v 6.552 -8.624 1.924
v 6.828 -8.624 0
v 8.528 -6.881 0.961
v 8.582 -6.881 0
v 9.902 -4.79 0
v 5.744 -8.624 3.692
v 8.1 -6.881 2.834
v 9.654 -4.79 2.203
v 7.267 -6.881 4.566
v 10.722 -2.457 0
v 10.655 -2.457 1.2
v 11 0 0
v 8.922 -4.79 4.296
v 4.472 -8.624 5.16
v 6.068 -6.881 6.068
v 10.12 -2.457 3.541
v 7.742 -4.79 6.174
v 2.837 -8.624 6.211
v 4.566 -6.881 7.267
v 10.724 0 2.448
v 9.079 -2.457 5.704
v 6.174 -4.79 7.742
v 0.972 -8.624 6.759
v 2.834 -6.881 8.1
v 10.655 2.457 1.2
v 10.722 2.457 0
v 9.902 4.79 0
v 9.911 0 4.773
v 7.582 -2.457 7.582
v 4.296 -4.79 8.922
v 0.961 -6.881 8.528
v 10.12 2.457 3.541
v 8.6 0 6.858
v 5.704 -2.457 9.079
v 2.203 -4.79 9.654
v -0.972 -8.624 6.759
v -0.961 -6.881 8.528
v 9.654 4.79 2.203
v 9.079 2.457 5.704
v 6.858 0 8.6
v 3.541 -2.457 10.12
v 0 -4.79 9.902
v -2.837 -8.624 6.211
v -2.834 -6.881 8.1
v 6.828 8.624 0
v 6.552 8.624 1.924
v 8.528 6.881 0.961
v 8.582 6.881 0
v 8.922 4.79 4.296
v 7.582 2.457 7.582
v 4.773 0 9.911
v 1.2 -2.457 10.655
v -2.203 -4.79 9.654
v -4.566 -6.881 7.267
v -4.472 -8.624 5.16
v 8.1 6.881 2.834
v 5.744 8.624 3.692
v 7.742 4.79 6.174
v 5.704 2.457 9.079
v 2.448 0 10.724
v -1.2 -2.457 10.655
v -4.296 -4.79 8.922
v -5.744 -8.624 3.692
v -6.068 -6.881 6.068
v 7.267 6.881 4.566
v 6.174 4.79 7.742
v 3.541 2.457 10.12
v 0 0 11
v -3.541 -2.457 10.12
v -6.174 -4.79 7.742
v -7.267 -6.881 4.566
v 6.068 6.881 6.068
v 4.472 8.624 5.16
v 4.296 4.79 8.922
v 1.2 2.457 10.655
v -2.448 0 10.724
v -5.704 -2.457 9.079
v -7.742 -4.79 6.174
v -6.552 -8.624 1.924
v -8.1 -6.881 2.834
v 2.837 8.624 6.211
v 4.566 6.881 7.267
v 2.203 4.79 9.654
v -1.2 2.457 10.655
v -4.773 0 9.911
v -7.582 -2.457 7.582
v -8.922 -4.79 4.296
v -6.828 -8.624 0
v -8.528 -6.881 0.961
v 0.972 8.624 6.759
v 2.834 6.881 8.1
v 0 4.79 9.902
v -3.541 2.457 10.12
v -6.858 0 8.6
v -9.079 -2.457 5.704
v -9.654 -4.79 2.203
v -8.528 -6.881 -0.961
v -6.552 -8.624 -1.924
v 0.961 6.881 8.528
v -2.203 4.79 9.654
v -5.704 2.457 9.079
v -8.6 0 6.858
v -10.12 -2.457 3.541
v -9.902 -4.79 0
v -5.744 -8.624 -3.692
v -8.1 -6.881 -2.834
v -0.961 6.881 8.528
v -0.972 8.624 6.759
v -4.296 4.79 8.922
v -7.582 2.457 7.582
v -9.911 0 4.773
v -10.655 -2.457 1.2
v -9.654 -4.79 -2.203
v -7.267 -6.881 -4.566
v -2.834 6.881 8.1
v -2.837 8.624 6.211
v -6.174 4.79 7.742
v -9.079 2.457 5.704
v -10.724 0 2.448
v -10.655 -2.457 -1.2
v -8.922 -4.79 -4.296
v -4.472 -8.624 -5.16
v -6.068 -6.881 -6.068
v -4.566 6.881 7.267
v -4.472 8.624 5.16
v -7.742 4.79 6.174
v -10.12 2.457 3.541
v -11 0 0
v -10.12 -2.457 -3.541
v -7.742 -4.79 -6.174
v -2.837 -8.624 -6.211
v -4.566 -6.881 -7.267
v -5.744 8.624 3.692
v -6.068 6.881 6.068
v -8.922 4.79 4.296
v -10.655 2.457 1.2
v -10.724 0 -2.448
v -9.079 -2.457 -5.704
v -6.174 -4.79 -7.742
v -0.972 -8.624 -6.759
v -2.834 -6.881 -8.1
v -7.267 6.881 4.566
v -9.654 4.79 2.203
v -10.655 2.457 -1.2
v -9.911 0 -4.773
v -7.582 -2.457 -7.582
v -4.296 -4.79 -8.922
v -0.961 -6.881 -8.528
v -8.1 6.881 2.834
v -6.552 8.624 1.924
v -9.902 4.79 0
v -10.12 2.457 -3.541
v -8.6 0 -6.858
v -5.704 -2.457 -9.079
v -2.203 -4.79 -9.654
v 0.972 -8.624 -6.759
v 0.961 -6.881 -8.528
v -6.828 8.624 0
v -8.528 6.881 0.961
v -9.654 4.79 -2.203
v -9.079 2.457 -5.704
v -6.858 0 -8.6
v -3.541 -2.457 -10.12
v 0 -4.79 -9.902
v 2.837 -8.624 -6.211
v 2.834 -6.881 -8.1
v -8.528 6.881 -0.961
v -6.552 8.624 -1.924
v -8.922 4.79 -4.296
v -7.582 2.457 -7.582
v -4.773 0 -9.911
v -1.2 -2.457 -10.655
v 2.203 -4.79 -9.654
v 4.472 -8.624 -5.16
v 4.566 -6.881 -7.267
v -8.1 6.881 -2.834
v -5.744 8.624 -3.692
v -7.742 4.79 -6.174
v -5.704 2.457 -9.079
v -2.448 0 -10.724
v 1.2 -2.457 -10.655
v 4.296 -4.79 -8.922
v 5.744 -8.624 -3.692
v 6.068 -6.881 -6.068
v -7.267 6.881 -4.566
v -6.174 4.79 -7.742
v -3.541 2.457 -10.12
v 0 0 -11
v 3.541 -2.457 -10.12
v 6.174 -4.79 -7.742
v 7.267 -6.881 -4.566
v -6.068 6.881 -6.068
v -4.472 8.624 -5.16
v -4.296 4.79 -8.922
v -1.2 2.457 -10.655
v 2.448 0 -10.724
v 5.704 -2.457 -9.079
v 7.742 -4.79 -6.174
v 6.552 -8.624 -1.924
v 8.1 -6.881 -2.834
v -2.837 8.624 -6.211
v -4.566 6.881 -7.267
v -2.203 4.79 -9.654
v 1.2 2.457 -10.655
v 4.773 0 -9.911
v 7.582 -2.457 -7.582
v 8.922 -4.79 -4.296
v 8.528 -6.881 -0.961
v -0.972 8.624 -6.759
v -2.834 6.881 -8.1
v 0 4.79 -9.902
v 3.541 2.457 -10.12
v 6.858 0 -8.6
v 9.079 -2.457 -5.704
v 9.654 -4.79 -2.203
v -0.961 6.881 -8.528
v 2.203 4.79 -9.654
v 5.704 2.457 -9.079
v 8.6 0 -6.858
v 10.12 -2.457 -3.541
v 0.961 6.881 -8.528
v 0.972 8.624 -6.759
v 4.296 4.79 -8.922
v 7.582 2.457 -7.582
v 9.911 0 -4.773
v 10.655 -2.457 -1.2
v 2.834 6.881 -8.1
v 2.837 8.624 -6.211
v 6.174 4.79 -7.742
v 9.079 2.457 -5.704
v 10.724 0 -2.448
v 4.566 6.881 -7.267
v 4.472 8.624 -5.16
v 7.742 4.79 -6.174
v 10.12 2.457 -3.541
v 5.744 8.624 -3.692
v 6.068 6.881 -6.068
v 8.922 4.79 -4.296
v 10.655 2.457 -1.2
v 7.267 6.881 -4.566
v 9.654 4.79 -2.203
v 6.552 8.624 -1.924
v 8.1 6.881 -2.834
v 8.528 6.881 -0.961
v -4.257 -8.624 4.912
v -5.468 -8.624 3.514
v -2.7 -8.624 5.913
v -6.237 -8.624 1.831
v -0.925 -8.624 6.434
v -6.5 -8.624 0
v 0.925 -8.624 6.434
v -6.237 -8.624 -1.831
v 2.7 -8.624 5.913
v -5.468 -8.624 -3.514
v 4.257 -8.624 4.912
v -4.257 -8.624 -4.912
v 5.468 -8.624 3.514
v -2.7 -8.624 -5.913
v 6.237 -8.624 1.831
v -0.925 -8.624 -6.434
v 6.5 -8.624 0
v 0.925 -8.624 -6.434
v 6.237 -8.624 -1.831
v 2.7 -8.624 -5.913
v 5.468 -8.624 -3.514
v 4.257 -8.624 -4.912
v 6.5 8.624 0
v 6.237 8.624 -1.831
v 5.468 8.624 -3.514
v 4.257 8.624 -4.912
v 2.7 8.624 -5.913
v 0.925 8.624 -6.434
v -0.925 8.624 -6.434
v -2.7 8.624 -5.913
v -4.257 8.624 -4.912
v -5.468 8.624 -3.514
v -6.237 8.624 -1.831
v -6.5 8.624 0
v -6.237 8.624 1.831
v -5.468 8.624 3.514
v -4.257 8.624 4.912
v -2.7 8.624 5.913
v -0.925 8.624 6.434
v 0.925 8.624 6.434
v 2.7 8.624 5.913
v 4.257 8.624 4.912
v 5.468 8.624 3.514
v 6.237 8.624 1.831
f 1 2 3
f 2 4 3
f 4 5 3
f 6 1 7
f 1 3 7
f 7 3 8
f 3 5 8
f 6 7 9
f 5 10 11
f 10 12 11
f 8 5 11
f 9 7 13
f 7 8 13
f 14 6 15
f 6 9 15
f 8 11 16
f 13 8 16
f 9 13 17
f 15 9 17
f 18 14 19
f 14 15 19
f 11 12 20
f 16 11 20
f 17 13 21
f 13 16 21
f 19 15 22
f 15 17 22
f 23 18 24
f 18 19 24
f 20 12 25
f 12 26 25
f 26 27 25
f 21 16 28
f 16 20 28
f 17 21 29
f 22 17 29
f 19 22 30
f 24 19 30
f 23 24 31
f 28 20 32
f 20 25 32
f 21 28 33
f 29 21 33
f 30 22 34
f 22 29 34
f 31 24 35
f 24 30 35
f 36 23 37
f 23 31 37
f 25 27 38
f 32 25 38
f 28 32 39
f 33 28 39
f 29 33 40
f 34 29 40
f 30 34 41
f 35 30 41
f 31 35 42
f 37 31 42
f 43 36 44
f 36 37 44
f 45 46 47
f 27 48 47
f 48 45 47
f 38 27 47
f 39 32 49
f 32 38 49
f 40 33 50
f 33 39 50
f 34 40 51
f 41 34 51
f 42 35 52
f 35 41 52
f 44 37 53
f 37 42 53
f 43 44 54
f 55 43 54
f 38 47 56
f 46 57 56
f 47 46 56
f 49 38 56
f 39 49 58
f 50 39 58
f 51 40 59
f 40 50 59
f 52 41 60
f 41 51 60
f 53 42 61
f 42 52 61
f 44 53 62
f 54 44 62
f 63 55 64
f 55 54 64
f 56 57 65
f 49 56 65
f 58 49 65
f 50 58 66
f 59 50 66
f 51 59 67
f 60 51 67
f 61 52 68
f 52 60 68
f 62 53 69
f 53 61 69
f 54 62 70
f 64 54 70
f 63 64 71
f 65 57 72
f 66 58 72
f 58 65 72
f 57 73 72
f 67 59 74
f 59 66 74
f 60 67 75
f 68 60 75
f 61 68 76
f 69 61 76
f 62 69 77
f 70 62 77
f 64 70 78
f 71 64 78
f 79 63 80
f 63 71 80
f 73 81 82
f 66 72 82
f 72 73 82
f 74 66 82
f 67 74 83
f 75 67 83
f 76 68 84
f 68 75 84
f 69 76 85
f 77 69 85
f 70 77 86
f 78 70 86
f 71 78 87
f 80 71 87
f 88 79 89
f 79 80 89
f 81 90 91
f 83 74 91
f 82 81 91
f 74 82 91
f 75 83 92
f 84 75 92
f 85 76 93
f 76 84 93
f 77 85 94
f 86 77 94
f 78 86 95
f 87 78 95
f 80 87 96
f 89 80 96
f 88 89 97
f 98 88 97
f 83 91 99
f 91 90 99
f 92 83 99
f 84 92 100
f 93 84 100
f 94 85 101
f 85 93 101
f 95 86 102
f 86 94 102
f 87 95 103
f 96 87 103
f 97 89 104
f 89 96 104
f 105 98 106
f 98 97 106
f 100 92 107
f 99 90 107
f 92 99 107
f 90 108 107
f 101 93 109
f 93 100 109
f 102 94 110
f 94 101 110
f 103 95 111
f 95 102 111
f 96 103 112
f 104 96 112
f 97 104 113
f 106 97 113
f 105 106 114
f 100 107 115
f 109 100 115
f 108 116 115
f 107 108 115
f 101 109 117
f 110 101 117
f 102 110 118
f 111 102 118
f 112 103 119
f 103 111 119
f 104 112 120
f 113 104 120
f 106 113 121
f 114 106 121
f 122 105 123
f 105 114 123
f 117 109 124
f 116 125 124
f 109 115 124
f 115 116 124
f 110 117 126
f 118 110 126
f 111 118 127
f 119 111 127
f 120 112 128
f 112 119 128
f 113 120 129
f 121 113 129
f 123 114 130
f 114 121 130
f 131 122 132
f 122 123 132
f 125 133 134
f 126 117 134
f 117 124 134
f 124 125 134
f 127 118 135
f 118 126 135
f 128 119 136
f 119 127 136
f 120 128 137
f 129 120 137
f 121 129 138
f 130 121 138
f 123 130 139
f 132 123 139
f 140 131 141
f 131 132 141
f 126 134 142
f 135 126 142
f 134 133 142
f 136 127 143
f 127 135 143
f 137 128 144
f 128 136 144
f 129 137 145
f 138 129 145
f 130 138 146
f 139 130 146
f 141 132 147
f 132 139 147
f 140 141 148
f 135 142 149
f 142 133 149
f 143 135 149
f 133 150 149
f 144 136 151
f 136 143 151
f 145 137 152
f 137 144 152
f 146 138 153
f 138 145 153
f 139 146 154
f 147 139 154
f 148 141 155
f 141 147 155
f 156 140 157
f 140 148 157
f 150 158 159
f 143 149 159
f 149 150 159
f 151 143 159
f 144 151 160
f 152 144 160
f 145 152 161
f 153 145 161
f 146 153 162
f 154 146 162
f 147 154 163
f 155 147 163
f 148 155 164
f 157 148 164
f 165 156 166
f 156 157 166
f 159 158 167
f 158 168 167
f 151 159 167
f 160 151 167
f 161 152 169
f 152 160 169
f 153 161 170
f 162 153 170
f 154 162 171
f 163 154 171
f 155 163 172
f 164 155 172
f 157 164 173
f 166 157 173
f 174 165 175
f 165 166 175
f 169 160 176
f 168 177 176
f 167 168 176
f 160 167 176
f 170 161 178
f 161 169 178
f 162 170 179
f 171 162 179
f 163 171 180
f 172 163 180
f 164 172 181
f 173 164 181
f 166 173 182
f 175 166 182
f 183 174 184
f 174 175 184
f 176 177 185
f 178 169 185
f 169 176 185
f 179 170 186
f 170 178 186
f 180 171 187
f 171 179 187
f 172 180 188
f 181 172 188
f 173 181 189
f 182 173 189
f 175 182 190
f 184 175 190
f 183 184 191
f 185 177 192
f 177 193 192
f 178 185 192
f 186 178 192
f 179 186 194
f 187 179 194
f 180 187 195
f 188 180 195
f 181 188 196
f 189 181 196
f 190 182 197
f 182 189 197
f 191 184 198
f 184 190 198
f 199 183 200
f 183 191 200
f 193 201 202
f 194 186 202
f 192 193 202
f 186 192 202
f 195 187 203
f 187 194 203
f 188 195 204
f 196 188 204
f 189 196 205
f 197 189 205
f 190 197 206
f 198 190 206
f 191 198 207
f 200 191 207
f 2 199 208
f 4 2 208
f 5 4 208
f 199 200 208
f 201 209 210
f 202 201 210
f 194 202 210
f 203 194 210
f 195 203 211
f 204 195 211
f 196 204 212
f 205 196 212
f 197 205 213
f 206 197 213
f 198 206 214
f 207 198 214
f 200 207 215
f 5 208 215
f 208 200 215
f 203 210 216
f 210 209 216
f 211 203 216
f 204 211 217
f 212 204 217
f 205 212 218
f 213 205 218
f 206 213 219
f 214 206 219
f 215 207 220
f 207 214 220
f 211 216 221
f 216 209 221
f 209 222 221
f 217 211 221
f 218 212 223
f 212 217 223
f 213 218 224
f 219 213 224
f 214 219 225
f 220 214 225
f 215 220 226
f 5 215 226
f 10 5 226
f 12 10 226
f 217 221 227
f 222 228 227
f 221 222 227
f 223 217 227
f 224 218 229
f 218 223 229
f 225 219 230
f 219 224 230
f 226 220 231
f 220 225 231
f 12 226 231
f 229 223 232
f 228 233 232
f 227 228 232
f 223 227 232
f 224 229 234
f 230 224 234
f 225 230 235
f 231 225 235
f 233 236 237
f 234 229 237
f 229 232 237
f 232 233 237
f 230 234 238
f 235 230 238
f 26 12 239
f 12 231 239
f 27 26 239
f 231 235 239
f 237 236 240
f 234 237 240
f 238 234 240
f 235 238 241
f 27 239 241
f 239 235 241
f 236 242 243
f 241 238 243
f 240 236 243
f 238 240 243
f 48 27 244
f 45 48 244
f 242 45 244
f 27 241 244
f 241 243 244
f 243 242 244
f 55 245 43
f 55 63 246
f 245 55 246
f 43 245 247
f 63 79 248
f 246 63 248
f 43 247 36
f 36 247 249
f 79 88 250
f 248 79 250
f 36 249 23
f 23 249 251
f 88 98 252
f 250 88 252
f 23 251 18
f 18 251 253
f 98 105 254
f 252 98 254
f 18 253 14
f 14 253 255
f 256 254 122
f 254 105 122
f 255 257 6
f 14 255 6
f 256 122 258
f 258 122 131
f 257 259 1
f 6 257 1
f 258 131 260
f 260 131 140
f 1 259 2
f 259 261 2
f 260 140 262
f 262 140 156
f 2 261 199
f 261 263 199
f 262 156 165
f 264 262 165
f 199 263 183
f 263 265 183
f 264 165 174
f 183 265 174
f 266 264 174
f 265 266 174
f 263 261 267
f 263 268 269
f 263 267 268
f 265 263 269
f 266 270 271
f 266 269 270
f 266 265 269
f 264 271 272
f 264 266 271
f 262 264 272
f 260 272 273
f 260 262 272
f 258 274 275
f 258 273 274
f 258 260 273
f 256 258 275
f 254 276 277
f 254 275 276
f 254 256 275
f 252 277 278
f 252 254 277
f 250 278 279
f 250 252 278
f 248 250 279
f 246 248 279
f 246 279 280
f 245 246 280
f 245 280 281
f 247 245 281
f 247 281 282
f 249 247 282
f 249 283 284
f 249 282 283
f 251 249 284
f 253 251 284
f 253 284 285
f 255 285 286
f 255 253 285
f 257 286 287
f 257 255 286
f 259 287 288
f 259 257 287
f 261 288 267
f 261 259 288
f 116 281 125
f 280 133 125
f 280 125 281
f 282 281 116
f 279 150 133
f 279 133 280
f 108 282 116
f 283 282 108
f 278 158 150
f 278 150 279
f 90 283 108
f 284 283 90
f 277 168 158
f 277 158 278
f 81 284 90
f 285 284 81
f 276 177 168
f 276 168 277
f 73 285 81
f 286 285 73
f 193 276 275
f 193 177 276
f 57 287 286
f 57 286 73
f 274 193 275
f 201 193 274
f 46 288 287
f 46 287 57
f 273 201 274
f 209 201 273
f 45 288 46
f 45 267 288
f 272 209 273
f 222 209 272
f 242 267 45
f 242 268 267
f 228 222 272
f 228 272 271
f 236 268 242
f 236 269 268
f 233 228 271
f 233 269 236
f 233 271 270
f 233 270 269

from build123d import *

# Parameters (mm, degrees)
CUT_EXTRUDE1_DEPTH      = 20.052558883
CUT_EXTRUDE1_DEPTH_BACK = 20.052558883
SKETCH2_R               = 6.5
CUT_EXTRUDE2_DEPTH      = 18.909494689
CUT_EXTRUDE2_DEPTH_BACK = 18.909494689
SKETCH3_W               = 22.753459083
SKETCH3_H               = 0.25
SKETCH3_W_2             = 23.945473889


with BuildPart() as part:
    # Sketch1 → Revolve1 (revolve)
    with BuildSketch(Plane.XY):
        with BuildLine():
            Line((0, 11), (0, -11))
            ThreePointArc((0, -11), (11, 0), (0, 11))
        make_face()
    revolve(axis=Axis((0, 11, 0), (0, -1, 0)))

    # Sketch2 → Cut-Extrude1 (cut, two sides: drawn at the far end of the back side and taken through both)
    with BuildSketch(Plane(origin=(0, 0, 0), x_dir=(1, 0, 0), z_dir=(0, 1, 0)).offset(-CUT_EXTRUDE1_DEPTH_BACK)):
        Circle(SKETCH2_R)
    extrude(amount=CUT_EXTRUDE1_DEPTH + CUT_EXTRUDE1_DEPTH_BACK, mode=Mode.SUBTRACT)

    # Sketch3 → Cut-Extrude2 (cut, two sides: drawn at the far end of the back side and taken through both)
    with BuildSketch(Plane.XY.offset(-CUT_EXTRUDE2_DEPTH_BACK)):
        with Locations((-0.087648148, 8.749119675)):
            Rectangle(SKETCH3_W, SKETCH3_H)
        with Locations((-0.227885183, -8.749119675)):
            Rectangle(SKETCH3_W_2, SKETCH3_H)
    extrude(amount=CUT_EXTRUDE2_DEPTH + CUT_EXTRUDE2_DEPTH_BACK, mode=Mode.SUBTRACT)


solid = part.part
